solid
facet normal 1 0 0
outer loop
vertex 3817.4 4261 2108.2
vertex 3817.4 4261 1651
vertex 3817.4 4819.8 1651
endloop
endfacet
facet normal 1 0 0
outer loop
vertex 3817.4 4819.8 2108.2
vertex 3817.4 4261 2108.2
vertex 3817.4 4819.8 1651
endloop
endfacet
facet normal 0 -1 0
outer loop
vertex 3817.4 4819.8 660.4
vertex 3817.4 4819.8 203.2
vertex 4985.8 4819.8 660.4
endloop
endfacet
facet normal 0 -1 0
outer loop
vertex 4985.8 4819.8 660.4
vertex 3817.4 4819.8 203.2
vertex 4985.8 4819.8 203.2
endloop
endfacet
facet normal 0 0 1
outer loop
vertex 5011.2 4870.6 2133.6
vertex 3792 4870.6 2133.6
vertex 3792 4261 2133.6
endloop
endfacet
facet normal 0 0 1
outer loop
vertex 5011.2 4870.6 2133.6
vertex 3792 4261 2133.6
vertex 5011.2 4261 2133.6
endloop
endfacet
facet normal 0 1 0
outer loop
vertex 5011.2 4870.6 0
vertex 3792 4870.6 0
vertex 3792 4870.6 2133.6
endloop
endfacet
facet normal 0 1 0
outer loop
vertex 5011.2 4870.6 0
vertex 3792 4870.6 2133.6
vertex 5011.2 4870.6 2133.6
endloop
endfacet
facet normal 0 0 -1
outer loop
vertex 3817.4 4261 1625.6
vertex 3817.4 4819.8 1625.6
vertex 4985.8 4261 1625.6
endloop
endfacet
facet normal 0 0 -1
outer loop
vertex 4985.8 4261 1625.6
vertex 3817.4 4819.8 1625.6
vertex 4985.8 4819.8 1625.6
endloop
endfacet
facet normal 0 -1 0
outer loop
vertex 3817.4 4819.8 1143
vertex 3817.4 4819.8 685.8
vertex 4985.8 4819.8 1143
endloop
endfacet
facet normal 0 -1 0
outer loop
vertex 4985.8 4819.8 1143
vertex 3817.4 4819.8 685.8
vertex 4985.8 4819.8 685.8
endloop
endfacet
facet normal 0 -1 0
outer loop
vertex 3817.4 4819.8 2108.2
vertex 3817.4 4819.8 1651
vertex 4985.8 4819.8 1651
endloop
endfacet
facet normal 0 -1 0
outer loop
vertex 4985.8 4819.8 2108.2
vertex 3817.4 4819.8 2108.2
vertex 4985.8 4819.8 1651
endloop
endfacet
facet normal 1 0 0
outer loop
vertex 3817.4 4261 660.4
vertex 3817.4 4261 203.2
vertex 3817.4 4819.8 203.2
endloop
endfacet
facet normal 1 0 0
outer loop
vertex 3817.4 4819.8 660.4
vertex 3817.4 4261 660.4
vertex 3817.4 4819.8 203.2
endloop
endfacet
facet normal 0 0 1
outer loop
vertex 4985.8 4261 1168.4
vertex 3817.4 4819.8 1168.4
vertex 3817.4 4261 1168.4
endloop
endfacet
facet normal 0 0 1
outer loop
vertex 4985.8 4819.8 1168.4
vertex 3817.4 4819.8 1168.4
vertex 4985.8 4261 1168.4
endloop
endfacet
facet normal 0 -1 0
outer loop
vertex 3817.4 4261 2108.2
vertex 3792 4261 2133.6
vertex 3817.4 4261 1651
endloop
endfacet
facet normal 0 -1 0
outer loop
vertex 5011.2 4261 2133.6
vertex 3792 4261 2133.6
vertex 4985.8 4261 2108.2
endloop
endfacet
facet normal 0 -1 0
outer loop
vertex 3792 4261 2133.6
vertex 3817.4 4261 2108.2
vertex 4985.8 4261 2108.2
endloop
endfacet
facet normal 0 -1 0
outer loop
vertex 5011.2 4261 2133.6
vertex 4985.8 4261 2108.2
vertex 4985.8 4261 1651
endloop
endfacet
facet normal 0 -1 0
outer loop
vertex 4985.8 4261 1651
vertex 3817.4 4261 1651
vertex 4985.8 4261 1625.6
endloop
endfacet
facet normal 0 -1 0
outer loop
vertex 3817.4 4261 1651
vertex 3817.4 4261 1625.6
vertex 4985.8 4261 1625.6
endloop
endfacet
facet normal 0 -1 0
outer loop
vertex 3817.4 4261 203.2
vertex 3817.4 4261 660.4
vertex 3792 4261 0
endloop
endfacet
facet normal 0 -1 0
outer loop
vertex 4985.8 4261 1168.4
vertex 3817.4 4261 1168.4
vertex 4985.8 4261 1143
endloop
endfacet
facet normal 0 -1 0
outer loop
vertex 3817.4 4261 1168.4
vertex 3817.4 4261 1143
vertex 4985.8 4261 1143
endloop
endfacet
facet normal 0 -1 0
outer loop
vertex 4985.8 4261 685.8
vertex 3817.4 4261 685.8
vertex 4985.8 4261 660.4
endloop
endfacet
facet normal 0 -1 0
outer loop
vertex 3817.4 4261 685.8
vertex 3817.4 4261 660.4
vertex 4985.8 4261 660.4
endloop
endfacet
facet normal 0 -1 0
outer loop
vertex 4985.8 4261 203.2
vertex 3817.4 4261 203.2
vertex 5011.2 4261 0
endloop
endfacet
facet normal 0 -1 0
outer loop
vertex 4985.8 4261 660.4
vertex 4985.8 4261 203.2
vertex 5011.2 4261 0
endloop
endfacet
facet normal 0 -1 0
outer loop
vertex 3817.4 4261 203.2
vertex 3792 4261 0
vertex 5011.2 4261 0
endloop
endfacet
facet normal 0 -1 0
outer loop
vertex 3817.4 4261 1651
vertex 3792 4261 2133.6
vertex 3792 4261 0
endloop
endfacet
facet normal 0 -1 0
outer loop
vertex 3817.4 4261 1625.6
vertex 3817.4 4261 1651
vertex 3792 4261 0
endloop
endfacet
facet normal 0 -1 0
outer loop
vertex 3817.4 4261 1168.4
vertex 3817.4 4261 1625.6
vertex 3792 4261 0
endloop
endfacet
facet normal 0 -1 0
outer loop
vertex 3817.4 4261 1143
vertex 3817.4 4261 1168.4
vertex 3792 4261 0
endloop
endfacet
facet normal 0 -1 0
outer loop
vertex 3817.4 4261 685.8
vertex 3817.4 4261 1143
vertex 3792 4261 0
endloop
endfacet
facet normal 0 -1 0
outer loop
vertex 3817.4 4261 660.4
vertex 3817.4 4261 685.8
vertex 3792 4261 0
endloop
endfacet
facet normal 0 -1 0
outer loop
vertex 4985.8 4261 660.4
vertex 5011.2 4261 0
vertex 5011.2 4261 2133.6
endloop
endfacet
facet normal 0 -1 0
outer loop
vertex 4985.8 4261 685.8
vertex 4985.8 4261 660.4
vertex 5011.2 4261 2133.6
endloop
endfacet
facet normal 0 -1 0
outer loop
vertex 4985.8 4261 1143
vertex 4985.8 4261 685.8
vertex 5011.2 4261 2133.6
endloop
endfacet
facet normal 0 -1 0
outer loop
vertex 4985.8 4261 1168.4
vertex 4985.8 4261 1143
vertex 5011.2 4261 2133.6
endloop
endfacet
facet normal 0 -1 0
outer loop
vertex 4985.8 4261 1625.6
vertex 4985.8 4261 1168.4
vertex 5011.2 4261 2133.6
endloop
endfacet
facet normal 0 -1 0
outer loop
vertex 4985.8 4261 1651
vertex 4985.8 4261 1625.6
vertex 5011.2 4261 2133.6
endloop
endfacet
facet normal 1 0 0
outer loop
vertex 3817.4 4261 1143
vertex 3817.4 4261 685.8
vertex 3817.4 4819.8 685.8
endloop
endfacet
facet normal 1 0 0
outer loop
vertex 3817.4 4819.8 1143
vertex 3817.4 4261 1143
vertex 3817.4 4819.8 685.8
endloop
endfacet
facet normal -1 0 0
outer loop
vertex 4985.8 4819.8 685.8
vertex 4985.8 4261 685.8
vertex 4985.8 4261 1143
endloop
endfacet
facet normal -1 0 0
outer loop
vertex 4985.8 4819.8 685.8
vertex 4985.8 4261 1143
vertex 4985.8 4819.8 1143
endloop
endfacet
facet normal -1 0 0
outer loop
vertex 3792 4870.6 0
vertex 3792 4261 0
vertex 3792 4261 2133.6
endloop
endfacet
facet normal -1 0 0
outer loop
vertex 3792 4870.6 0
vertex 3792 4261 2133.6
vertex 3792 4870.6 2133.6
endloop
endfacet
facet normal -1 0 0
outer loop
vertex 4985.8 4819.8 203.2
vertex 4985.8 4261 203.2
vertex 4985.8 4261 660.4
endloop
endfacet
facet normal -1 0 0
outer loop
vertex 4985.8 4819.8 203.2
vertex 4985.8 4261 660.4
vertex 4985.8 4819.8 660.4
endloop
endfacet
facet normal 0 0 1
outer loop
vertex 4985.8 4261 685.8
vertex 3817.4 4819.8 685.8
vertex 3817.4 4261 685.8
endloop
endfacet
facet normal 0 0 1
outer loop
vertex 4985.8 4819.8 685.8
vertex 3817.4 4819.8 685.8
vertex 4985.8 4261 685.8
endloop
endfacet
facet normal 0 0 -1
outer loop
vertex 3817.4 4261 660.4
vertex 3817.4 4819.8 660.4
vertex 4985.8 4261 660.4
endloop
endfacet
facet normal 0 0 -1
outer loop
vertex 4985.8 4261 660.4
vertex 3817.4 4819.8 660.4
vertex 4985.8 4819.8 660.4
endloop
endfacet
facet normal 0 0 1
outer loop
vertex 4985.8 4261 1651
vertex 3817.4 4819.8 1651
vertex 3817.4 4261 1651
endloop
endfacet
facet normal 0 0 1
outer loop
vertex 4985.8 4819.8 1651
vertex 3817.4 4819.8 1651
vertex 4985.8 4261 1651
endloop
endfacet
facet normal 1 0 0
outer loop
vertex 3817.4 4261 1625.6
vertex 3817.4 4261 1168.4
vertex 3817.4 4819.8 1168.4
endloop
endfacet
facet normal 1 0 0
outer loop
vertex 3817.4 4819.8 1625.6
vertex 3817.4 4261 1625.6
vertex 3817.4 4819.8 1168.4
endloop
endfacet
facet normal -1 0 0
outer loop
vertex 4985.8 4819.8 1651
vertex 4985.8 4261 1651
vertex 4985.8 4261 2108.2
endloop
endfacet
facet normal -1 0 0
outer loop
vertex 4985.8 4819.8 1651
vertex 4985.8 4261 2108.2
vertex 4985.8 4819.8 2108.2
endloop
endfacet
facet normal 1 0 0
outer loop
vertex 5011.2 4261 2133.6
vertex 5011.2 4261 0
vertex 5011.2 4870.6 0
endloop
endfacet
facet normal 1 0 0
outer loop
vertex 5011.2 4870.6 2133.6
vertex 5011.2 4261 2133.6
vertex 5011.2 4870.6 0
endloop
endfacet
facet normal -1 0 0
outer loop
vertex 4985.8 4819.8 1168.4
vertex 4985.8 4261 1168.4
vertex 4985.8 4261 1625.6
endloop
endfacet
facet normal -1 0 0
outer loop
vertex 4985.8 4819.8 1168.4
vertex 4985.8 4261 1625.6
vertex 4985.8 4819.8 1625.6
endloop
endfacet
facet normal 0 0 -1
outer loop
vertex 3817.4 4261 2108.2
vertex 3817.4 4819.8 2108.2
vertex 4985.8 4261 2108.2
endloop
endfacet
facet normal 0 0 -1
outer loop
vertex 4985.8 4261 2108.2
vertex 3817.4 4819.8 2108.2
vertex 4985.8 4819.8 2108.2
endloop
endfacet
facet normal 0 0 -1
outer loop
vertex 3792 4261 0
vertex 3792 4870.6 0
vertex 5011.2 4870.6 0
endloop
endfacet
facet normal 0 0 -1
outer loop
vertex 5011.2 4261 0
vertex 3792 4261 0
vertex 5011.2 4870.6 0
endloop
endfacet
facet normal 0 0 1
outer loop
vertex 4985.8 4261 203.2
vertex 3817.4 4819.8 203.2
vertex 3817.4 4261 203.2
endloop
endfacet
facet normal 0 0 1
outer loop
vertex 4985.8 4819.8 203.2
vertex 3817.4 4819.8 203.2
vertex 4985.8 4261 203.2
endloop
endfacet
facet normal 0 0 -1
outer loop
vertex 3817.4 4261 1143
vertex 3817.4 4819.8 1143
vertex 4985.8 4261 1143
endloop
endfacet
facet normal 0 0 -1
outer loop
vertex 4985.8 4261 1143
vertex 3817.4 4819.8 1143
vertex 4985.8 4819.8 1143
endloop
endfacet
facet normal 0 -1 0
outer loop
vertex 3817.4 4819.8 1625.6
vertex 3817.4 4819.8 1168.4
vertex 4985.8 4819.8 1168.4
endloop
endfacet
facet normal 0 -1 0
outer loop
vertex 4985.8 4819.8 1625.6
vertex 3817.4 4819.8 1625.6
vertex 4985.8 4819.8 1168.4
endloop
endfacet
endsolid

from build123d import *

# Parameters (mm, degrees)
BOX022_W     = 1168.4
BOX022_H     = 558.8
BOX022_DEPTH = 457.2
BOX021_W     = 1168.4
BOX021_H     = 558.8
BOX021_DEPTH = 457.2
BOX020_W     = 1168.4
BOX020_H     = 558.8
BOX020_DEPTH = 457.2
BOX019_W     = 1168.4
BOX019_H     = 558.8
BOX019_DEPTH = 457.2
BOX018_W     = 1219.2
BOX018_H     = 609.6
BOX018_DEPTH = 2133.6


with BuildPart() as cube022:
    # Box022 → Box022 (new body)
    with BuildSketch(Plane(origin=(25.4, 0, 1651), x_dir=(1, 0, 0), z_dir=(0, 0, 1))):
        with Locations((584.2, 279.4)):
            Rectangle(BOX022_W, BOX022_H)
    extrude(amount=BOX022_DEPTH)


with BuildPart() as cube021:
    # Box021 → Box021 (new body)
    with BuildSketch(Plane(origin=(25.4, 0, 685.8), x_dir=(1, 0, 0), z_dir=(0, 0, 1))):
        with Locations((584.2, 279.4)):
            Rectangle(BOX021_W, BOX021_H)
    extrude(amount=BOX021_DEPTH)


with BuildPart() as cube020:
    # Box020 → Box020 (new body)
    with BuildSketch(Plane(origin=(25.4, 0, 203.2), x_dir=(1, 0, 0), z_dir=(0, 0, 1))):
        with Locations((584.2, 279.4)):
            Rectangle(BOX020_W, BOX020_H)
    extrude(amount=BOX020_DEPTH)


with BuildPart() as cube019:
    # Box019 → Box019 (new body)
    with BuildSketch(Plane(origin=(25.4, 0, 1168.4), x_dir=(1, 0, 0), z_dir=(0, 0, 1))):
        with Locations((584.2, 279.4)):
            Rectangle(BOX019_W, BOX019_H)
    extrude(amount=BOX019_DEPTH)


with BuildPart() as cut009:
    # Box018 → Box018 (new body)
    with BuildSketch(Plane.XY):
        with Locations((609.6, 304.8)):
            Rectangle(BOX018_W, BOX018_H)
    extrude(amount=BOX018_DEPTH)

    # Cut006: cut Cube019
    add(cube019.part, mode=Mode.SUBTRACT)

    # Cut007: cut Cube020
    add(cube020.part, mode=Mode.SUBTRACT)

    # Cut008: cut Cube021
    add(cube021.part, mode=Mode.SUBTRACT)

    # Cut009: cut Cube022
    add(cube022.part, mode=Mode.SUBTRACT)


with BuildPart() as cut009_1:
    # Cut009 placement: moved
    add(cut009.part.moved(Location((3792, 4261, 0))))


solid = cut009_1.part
